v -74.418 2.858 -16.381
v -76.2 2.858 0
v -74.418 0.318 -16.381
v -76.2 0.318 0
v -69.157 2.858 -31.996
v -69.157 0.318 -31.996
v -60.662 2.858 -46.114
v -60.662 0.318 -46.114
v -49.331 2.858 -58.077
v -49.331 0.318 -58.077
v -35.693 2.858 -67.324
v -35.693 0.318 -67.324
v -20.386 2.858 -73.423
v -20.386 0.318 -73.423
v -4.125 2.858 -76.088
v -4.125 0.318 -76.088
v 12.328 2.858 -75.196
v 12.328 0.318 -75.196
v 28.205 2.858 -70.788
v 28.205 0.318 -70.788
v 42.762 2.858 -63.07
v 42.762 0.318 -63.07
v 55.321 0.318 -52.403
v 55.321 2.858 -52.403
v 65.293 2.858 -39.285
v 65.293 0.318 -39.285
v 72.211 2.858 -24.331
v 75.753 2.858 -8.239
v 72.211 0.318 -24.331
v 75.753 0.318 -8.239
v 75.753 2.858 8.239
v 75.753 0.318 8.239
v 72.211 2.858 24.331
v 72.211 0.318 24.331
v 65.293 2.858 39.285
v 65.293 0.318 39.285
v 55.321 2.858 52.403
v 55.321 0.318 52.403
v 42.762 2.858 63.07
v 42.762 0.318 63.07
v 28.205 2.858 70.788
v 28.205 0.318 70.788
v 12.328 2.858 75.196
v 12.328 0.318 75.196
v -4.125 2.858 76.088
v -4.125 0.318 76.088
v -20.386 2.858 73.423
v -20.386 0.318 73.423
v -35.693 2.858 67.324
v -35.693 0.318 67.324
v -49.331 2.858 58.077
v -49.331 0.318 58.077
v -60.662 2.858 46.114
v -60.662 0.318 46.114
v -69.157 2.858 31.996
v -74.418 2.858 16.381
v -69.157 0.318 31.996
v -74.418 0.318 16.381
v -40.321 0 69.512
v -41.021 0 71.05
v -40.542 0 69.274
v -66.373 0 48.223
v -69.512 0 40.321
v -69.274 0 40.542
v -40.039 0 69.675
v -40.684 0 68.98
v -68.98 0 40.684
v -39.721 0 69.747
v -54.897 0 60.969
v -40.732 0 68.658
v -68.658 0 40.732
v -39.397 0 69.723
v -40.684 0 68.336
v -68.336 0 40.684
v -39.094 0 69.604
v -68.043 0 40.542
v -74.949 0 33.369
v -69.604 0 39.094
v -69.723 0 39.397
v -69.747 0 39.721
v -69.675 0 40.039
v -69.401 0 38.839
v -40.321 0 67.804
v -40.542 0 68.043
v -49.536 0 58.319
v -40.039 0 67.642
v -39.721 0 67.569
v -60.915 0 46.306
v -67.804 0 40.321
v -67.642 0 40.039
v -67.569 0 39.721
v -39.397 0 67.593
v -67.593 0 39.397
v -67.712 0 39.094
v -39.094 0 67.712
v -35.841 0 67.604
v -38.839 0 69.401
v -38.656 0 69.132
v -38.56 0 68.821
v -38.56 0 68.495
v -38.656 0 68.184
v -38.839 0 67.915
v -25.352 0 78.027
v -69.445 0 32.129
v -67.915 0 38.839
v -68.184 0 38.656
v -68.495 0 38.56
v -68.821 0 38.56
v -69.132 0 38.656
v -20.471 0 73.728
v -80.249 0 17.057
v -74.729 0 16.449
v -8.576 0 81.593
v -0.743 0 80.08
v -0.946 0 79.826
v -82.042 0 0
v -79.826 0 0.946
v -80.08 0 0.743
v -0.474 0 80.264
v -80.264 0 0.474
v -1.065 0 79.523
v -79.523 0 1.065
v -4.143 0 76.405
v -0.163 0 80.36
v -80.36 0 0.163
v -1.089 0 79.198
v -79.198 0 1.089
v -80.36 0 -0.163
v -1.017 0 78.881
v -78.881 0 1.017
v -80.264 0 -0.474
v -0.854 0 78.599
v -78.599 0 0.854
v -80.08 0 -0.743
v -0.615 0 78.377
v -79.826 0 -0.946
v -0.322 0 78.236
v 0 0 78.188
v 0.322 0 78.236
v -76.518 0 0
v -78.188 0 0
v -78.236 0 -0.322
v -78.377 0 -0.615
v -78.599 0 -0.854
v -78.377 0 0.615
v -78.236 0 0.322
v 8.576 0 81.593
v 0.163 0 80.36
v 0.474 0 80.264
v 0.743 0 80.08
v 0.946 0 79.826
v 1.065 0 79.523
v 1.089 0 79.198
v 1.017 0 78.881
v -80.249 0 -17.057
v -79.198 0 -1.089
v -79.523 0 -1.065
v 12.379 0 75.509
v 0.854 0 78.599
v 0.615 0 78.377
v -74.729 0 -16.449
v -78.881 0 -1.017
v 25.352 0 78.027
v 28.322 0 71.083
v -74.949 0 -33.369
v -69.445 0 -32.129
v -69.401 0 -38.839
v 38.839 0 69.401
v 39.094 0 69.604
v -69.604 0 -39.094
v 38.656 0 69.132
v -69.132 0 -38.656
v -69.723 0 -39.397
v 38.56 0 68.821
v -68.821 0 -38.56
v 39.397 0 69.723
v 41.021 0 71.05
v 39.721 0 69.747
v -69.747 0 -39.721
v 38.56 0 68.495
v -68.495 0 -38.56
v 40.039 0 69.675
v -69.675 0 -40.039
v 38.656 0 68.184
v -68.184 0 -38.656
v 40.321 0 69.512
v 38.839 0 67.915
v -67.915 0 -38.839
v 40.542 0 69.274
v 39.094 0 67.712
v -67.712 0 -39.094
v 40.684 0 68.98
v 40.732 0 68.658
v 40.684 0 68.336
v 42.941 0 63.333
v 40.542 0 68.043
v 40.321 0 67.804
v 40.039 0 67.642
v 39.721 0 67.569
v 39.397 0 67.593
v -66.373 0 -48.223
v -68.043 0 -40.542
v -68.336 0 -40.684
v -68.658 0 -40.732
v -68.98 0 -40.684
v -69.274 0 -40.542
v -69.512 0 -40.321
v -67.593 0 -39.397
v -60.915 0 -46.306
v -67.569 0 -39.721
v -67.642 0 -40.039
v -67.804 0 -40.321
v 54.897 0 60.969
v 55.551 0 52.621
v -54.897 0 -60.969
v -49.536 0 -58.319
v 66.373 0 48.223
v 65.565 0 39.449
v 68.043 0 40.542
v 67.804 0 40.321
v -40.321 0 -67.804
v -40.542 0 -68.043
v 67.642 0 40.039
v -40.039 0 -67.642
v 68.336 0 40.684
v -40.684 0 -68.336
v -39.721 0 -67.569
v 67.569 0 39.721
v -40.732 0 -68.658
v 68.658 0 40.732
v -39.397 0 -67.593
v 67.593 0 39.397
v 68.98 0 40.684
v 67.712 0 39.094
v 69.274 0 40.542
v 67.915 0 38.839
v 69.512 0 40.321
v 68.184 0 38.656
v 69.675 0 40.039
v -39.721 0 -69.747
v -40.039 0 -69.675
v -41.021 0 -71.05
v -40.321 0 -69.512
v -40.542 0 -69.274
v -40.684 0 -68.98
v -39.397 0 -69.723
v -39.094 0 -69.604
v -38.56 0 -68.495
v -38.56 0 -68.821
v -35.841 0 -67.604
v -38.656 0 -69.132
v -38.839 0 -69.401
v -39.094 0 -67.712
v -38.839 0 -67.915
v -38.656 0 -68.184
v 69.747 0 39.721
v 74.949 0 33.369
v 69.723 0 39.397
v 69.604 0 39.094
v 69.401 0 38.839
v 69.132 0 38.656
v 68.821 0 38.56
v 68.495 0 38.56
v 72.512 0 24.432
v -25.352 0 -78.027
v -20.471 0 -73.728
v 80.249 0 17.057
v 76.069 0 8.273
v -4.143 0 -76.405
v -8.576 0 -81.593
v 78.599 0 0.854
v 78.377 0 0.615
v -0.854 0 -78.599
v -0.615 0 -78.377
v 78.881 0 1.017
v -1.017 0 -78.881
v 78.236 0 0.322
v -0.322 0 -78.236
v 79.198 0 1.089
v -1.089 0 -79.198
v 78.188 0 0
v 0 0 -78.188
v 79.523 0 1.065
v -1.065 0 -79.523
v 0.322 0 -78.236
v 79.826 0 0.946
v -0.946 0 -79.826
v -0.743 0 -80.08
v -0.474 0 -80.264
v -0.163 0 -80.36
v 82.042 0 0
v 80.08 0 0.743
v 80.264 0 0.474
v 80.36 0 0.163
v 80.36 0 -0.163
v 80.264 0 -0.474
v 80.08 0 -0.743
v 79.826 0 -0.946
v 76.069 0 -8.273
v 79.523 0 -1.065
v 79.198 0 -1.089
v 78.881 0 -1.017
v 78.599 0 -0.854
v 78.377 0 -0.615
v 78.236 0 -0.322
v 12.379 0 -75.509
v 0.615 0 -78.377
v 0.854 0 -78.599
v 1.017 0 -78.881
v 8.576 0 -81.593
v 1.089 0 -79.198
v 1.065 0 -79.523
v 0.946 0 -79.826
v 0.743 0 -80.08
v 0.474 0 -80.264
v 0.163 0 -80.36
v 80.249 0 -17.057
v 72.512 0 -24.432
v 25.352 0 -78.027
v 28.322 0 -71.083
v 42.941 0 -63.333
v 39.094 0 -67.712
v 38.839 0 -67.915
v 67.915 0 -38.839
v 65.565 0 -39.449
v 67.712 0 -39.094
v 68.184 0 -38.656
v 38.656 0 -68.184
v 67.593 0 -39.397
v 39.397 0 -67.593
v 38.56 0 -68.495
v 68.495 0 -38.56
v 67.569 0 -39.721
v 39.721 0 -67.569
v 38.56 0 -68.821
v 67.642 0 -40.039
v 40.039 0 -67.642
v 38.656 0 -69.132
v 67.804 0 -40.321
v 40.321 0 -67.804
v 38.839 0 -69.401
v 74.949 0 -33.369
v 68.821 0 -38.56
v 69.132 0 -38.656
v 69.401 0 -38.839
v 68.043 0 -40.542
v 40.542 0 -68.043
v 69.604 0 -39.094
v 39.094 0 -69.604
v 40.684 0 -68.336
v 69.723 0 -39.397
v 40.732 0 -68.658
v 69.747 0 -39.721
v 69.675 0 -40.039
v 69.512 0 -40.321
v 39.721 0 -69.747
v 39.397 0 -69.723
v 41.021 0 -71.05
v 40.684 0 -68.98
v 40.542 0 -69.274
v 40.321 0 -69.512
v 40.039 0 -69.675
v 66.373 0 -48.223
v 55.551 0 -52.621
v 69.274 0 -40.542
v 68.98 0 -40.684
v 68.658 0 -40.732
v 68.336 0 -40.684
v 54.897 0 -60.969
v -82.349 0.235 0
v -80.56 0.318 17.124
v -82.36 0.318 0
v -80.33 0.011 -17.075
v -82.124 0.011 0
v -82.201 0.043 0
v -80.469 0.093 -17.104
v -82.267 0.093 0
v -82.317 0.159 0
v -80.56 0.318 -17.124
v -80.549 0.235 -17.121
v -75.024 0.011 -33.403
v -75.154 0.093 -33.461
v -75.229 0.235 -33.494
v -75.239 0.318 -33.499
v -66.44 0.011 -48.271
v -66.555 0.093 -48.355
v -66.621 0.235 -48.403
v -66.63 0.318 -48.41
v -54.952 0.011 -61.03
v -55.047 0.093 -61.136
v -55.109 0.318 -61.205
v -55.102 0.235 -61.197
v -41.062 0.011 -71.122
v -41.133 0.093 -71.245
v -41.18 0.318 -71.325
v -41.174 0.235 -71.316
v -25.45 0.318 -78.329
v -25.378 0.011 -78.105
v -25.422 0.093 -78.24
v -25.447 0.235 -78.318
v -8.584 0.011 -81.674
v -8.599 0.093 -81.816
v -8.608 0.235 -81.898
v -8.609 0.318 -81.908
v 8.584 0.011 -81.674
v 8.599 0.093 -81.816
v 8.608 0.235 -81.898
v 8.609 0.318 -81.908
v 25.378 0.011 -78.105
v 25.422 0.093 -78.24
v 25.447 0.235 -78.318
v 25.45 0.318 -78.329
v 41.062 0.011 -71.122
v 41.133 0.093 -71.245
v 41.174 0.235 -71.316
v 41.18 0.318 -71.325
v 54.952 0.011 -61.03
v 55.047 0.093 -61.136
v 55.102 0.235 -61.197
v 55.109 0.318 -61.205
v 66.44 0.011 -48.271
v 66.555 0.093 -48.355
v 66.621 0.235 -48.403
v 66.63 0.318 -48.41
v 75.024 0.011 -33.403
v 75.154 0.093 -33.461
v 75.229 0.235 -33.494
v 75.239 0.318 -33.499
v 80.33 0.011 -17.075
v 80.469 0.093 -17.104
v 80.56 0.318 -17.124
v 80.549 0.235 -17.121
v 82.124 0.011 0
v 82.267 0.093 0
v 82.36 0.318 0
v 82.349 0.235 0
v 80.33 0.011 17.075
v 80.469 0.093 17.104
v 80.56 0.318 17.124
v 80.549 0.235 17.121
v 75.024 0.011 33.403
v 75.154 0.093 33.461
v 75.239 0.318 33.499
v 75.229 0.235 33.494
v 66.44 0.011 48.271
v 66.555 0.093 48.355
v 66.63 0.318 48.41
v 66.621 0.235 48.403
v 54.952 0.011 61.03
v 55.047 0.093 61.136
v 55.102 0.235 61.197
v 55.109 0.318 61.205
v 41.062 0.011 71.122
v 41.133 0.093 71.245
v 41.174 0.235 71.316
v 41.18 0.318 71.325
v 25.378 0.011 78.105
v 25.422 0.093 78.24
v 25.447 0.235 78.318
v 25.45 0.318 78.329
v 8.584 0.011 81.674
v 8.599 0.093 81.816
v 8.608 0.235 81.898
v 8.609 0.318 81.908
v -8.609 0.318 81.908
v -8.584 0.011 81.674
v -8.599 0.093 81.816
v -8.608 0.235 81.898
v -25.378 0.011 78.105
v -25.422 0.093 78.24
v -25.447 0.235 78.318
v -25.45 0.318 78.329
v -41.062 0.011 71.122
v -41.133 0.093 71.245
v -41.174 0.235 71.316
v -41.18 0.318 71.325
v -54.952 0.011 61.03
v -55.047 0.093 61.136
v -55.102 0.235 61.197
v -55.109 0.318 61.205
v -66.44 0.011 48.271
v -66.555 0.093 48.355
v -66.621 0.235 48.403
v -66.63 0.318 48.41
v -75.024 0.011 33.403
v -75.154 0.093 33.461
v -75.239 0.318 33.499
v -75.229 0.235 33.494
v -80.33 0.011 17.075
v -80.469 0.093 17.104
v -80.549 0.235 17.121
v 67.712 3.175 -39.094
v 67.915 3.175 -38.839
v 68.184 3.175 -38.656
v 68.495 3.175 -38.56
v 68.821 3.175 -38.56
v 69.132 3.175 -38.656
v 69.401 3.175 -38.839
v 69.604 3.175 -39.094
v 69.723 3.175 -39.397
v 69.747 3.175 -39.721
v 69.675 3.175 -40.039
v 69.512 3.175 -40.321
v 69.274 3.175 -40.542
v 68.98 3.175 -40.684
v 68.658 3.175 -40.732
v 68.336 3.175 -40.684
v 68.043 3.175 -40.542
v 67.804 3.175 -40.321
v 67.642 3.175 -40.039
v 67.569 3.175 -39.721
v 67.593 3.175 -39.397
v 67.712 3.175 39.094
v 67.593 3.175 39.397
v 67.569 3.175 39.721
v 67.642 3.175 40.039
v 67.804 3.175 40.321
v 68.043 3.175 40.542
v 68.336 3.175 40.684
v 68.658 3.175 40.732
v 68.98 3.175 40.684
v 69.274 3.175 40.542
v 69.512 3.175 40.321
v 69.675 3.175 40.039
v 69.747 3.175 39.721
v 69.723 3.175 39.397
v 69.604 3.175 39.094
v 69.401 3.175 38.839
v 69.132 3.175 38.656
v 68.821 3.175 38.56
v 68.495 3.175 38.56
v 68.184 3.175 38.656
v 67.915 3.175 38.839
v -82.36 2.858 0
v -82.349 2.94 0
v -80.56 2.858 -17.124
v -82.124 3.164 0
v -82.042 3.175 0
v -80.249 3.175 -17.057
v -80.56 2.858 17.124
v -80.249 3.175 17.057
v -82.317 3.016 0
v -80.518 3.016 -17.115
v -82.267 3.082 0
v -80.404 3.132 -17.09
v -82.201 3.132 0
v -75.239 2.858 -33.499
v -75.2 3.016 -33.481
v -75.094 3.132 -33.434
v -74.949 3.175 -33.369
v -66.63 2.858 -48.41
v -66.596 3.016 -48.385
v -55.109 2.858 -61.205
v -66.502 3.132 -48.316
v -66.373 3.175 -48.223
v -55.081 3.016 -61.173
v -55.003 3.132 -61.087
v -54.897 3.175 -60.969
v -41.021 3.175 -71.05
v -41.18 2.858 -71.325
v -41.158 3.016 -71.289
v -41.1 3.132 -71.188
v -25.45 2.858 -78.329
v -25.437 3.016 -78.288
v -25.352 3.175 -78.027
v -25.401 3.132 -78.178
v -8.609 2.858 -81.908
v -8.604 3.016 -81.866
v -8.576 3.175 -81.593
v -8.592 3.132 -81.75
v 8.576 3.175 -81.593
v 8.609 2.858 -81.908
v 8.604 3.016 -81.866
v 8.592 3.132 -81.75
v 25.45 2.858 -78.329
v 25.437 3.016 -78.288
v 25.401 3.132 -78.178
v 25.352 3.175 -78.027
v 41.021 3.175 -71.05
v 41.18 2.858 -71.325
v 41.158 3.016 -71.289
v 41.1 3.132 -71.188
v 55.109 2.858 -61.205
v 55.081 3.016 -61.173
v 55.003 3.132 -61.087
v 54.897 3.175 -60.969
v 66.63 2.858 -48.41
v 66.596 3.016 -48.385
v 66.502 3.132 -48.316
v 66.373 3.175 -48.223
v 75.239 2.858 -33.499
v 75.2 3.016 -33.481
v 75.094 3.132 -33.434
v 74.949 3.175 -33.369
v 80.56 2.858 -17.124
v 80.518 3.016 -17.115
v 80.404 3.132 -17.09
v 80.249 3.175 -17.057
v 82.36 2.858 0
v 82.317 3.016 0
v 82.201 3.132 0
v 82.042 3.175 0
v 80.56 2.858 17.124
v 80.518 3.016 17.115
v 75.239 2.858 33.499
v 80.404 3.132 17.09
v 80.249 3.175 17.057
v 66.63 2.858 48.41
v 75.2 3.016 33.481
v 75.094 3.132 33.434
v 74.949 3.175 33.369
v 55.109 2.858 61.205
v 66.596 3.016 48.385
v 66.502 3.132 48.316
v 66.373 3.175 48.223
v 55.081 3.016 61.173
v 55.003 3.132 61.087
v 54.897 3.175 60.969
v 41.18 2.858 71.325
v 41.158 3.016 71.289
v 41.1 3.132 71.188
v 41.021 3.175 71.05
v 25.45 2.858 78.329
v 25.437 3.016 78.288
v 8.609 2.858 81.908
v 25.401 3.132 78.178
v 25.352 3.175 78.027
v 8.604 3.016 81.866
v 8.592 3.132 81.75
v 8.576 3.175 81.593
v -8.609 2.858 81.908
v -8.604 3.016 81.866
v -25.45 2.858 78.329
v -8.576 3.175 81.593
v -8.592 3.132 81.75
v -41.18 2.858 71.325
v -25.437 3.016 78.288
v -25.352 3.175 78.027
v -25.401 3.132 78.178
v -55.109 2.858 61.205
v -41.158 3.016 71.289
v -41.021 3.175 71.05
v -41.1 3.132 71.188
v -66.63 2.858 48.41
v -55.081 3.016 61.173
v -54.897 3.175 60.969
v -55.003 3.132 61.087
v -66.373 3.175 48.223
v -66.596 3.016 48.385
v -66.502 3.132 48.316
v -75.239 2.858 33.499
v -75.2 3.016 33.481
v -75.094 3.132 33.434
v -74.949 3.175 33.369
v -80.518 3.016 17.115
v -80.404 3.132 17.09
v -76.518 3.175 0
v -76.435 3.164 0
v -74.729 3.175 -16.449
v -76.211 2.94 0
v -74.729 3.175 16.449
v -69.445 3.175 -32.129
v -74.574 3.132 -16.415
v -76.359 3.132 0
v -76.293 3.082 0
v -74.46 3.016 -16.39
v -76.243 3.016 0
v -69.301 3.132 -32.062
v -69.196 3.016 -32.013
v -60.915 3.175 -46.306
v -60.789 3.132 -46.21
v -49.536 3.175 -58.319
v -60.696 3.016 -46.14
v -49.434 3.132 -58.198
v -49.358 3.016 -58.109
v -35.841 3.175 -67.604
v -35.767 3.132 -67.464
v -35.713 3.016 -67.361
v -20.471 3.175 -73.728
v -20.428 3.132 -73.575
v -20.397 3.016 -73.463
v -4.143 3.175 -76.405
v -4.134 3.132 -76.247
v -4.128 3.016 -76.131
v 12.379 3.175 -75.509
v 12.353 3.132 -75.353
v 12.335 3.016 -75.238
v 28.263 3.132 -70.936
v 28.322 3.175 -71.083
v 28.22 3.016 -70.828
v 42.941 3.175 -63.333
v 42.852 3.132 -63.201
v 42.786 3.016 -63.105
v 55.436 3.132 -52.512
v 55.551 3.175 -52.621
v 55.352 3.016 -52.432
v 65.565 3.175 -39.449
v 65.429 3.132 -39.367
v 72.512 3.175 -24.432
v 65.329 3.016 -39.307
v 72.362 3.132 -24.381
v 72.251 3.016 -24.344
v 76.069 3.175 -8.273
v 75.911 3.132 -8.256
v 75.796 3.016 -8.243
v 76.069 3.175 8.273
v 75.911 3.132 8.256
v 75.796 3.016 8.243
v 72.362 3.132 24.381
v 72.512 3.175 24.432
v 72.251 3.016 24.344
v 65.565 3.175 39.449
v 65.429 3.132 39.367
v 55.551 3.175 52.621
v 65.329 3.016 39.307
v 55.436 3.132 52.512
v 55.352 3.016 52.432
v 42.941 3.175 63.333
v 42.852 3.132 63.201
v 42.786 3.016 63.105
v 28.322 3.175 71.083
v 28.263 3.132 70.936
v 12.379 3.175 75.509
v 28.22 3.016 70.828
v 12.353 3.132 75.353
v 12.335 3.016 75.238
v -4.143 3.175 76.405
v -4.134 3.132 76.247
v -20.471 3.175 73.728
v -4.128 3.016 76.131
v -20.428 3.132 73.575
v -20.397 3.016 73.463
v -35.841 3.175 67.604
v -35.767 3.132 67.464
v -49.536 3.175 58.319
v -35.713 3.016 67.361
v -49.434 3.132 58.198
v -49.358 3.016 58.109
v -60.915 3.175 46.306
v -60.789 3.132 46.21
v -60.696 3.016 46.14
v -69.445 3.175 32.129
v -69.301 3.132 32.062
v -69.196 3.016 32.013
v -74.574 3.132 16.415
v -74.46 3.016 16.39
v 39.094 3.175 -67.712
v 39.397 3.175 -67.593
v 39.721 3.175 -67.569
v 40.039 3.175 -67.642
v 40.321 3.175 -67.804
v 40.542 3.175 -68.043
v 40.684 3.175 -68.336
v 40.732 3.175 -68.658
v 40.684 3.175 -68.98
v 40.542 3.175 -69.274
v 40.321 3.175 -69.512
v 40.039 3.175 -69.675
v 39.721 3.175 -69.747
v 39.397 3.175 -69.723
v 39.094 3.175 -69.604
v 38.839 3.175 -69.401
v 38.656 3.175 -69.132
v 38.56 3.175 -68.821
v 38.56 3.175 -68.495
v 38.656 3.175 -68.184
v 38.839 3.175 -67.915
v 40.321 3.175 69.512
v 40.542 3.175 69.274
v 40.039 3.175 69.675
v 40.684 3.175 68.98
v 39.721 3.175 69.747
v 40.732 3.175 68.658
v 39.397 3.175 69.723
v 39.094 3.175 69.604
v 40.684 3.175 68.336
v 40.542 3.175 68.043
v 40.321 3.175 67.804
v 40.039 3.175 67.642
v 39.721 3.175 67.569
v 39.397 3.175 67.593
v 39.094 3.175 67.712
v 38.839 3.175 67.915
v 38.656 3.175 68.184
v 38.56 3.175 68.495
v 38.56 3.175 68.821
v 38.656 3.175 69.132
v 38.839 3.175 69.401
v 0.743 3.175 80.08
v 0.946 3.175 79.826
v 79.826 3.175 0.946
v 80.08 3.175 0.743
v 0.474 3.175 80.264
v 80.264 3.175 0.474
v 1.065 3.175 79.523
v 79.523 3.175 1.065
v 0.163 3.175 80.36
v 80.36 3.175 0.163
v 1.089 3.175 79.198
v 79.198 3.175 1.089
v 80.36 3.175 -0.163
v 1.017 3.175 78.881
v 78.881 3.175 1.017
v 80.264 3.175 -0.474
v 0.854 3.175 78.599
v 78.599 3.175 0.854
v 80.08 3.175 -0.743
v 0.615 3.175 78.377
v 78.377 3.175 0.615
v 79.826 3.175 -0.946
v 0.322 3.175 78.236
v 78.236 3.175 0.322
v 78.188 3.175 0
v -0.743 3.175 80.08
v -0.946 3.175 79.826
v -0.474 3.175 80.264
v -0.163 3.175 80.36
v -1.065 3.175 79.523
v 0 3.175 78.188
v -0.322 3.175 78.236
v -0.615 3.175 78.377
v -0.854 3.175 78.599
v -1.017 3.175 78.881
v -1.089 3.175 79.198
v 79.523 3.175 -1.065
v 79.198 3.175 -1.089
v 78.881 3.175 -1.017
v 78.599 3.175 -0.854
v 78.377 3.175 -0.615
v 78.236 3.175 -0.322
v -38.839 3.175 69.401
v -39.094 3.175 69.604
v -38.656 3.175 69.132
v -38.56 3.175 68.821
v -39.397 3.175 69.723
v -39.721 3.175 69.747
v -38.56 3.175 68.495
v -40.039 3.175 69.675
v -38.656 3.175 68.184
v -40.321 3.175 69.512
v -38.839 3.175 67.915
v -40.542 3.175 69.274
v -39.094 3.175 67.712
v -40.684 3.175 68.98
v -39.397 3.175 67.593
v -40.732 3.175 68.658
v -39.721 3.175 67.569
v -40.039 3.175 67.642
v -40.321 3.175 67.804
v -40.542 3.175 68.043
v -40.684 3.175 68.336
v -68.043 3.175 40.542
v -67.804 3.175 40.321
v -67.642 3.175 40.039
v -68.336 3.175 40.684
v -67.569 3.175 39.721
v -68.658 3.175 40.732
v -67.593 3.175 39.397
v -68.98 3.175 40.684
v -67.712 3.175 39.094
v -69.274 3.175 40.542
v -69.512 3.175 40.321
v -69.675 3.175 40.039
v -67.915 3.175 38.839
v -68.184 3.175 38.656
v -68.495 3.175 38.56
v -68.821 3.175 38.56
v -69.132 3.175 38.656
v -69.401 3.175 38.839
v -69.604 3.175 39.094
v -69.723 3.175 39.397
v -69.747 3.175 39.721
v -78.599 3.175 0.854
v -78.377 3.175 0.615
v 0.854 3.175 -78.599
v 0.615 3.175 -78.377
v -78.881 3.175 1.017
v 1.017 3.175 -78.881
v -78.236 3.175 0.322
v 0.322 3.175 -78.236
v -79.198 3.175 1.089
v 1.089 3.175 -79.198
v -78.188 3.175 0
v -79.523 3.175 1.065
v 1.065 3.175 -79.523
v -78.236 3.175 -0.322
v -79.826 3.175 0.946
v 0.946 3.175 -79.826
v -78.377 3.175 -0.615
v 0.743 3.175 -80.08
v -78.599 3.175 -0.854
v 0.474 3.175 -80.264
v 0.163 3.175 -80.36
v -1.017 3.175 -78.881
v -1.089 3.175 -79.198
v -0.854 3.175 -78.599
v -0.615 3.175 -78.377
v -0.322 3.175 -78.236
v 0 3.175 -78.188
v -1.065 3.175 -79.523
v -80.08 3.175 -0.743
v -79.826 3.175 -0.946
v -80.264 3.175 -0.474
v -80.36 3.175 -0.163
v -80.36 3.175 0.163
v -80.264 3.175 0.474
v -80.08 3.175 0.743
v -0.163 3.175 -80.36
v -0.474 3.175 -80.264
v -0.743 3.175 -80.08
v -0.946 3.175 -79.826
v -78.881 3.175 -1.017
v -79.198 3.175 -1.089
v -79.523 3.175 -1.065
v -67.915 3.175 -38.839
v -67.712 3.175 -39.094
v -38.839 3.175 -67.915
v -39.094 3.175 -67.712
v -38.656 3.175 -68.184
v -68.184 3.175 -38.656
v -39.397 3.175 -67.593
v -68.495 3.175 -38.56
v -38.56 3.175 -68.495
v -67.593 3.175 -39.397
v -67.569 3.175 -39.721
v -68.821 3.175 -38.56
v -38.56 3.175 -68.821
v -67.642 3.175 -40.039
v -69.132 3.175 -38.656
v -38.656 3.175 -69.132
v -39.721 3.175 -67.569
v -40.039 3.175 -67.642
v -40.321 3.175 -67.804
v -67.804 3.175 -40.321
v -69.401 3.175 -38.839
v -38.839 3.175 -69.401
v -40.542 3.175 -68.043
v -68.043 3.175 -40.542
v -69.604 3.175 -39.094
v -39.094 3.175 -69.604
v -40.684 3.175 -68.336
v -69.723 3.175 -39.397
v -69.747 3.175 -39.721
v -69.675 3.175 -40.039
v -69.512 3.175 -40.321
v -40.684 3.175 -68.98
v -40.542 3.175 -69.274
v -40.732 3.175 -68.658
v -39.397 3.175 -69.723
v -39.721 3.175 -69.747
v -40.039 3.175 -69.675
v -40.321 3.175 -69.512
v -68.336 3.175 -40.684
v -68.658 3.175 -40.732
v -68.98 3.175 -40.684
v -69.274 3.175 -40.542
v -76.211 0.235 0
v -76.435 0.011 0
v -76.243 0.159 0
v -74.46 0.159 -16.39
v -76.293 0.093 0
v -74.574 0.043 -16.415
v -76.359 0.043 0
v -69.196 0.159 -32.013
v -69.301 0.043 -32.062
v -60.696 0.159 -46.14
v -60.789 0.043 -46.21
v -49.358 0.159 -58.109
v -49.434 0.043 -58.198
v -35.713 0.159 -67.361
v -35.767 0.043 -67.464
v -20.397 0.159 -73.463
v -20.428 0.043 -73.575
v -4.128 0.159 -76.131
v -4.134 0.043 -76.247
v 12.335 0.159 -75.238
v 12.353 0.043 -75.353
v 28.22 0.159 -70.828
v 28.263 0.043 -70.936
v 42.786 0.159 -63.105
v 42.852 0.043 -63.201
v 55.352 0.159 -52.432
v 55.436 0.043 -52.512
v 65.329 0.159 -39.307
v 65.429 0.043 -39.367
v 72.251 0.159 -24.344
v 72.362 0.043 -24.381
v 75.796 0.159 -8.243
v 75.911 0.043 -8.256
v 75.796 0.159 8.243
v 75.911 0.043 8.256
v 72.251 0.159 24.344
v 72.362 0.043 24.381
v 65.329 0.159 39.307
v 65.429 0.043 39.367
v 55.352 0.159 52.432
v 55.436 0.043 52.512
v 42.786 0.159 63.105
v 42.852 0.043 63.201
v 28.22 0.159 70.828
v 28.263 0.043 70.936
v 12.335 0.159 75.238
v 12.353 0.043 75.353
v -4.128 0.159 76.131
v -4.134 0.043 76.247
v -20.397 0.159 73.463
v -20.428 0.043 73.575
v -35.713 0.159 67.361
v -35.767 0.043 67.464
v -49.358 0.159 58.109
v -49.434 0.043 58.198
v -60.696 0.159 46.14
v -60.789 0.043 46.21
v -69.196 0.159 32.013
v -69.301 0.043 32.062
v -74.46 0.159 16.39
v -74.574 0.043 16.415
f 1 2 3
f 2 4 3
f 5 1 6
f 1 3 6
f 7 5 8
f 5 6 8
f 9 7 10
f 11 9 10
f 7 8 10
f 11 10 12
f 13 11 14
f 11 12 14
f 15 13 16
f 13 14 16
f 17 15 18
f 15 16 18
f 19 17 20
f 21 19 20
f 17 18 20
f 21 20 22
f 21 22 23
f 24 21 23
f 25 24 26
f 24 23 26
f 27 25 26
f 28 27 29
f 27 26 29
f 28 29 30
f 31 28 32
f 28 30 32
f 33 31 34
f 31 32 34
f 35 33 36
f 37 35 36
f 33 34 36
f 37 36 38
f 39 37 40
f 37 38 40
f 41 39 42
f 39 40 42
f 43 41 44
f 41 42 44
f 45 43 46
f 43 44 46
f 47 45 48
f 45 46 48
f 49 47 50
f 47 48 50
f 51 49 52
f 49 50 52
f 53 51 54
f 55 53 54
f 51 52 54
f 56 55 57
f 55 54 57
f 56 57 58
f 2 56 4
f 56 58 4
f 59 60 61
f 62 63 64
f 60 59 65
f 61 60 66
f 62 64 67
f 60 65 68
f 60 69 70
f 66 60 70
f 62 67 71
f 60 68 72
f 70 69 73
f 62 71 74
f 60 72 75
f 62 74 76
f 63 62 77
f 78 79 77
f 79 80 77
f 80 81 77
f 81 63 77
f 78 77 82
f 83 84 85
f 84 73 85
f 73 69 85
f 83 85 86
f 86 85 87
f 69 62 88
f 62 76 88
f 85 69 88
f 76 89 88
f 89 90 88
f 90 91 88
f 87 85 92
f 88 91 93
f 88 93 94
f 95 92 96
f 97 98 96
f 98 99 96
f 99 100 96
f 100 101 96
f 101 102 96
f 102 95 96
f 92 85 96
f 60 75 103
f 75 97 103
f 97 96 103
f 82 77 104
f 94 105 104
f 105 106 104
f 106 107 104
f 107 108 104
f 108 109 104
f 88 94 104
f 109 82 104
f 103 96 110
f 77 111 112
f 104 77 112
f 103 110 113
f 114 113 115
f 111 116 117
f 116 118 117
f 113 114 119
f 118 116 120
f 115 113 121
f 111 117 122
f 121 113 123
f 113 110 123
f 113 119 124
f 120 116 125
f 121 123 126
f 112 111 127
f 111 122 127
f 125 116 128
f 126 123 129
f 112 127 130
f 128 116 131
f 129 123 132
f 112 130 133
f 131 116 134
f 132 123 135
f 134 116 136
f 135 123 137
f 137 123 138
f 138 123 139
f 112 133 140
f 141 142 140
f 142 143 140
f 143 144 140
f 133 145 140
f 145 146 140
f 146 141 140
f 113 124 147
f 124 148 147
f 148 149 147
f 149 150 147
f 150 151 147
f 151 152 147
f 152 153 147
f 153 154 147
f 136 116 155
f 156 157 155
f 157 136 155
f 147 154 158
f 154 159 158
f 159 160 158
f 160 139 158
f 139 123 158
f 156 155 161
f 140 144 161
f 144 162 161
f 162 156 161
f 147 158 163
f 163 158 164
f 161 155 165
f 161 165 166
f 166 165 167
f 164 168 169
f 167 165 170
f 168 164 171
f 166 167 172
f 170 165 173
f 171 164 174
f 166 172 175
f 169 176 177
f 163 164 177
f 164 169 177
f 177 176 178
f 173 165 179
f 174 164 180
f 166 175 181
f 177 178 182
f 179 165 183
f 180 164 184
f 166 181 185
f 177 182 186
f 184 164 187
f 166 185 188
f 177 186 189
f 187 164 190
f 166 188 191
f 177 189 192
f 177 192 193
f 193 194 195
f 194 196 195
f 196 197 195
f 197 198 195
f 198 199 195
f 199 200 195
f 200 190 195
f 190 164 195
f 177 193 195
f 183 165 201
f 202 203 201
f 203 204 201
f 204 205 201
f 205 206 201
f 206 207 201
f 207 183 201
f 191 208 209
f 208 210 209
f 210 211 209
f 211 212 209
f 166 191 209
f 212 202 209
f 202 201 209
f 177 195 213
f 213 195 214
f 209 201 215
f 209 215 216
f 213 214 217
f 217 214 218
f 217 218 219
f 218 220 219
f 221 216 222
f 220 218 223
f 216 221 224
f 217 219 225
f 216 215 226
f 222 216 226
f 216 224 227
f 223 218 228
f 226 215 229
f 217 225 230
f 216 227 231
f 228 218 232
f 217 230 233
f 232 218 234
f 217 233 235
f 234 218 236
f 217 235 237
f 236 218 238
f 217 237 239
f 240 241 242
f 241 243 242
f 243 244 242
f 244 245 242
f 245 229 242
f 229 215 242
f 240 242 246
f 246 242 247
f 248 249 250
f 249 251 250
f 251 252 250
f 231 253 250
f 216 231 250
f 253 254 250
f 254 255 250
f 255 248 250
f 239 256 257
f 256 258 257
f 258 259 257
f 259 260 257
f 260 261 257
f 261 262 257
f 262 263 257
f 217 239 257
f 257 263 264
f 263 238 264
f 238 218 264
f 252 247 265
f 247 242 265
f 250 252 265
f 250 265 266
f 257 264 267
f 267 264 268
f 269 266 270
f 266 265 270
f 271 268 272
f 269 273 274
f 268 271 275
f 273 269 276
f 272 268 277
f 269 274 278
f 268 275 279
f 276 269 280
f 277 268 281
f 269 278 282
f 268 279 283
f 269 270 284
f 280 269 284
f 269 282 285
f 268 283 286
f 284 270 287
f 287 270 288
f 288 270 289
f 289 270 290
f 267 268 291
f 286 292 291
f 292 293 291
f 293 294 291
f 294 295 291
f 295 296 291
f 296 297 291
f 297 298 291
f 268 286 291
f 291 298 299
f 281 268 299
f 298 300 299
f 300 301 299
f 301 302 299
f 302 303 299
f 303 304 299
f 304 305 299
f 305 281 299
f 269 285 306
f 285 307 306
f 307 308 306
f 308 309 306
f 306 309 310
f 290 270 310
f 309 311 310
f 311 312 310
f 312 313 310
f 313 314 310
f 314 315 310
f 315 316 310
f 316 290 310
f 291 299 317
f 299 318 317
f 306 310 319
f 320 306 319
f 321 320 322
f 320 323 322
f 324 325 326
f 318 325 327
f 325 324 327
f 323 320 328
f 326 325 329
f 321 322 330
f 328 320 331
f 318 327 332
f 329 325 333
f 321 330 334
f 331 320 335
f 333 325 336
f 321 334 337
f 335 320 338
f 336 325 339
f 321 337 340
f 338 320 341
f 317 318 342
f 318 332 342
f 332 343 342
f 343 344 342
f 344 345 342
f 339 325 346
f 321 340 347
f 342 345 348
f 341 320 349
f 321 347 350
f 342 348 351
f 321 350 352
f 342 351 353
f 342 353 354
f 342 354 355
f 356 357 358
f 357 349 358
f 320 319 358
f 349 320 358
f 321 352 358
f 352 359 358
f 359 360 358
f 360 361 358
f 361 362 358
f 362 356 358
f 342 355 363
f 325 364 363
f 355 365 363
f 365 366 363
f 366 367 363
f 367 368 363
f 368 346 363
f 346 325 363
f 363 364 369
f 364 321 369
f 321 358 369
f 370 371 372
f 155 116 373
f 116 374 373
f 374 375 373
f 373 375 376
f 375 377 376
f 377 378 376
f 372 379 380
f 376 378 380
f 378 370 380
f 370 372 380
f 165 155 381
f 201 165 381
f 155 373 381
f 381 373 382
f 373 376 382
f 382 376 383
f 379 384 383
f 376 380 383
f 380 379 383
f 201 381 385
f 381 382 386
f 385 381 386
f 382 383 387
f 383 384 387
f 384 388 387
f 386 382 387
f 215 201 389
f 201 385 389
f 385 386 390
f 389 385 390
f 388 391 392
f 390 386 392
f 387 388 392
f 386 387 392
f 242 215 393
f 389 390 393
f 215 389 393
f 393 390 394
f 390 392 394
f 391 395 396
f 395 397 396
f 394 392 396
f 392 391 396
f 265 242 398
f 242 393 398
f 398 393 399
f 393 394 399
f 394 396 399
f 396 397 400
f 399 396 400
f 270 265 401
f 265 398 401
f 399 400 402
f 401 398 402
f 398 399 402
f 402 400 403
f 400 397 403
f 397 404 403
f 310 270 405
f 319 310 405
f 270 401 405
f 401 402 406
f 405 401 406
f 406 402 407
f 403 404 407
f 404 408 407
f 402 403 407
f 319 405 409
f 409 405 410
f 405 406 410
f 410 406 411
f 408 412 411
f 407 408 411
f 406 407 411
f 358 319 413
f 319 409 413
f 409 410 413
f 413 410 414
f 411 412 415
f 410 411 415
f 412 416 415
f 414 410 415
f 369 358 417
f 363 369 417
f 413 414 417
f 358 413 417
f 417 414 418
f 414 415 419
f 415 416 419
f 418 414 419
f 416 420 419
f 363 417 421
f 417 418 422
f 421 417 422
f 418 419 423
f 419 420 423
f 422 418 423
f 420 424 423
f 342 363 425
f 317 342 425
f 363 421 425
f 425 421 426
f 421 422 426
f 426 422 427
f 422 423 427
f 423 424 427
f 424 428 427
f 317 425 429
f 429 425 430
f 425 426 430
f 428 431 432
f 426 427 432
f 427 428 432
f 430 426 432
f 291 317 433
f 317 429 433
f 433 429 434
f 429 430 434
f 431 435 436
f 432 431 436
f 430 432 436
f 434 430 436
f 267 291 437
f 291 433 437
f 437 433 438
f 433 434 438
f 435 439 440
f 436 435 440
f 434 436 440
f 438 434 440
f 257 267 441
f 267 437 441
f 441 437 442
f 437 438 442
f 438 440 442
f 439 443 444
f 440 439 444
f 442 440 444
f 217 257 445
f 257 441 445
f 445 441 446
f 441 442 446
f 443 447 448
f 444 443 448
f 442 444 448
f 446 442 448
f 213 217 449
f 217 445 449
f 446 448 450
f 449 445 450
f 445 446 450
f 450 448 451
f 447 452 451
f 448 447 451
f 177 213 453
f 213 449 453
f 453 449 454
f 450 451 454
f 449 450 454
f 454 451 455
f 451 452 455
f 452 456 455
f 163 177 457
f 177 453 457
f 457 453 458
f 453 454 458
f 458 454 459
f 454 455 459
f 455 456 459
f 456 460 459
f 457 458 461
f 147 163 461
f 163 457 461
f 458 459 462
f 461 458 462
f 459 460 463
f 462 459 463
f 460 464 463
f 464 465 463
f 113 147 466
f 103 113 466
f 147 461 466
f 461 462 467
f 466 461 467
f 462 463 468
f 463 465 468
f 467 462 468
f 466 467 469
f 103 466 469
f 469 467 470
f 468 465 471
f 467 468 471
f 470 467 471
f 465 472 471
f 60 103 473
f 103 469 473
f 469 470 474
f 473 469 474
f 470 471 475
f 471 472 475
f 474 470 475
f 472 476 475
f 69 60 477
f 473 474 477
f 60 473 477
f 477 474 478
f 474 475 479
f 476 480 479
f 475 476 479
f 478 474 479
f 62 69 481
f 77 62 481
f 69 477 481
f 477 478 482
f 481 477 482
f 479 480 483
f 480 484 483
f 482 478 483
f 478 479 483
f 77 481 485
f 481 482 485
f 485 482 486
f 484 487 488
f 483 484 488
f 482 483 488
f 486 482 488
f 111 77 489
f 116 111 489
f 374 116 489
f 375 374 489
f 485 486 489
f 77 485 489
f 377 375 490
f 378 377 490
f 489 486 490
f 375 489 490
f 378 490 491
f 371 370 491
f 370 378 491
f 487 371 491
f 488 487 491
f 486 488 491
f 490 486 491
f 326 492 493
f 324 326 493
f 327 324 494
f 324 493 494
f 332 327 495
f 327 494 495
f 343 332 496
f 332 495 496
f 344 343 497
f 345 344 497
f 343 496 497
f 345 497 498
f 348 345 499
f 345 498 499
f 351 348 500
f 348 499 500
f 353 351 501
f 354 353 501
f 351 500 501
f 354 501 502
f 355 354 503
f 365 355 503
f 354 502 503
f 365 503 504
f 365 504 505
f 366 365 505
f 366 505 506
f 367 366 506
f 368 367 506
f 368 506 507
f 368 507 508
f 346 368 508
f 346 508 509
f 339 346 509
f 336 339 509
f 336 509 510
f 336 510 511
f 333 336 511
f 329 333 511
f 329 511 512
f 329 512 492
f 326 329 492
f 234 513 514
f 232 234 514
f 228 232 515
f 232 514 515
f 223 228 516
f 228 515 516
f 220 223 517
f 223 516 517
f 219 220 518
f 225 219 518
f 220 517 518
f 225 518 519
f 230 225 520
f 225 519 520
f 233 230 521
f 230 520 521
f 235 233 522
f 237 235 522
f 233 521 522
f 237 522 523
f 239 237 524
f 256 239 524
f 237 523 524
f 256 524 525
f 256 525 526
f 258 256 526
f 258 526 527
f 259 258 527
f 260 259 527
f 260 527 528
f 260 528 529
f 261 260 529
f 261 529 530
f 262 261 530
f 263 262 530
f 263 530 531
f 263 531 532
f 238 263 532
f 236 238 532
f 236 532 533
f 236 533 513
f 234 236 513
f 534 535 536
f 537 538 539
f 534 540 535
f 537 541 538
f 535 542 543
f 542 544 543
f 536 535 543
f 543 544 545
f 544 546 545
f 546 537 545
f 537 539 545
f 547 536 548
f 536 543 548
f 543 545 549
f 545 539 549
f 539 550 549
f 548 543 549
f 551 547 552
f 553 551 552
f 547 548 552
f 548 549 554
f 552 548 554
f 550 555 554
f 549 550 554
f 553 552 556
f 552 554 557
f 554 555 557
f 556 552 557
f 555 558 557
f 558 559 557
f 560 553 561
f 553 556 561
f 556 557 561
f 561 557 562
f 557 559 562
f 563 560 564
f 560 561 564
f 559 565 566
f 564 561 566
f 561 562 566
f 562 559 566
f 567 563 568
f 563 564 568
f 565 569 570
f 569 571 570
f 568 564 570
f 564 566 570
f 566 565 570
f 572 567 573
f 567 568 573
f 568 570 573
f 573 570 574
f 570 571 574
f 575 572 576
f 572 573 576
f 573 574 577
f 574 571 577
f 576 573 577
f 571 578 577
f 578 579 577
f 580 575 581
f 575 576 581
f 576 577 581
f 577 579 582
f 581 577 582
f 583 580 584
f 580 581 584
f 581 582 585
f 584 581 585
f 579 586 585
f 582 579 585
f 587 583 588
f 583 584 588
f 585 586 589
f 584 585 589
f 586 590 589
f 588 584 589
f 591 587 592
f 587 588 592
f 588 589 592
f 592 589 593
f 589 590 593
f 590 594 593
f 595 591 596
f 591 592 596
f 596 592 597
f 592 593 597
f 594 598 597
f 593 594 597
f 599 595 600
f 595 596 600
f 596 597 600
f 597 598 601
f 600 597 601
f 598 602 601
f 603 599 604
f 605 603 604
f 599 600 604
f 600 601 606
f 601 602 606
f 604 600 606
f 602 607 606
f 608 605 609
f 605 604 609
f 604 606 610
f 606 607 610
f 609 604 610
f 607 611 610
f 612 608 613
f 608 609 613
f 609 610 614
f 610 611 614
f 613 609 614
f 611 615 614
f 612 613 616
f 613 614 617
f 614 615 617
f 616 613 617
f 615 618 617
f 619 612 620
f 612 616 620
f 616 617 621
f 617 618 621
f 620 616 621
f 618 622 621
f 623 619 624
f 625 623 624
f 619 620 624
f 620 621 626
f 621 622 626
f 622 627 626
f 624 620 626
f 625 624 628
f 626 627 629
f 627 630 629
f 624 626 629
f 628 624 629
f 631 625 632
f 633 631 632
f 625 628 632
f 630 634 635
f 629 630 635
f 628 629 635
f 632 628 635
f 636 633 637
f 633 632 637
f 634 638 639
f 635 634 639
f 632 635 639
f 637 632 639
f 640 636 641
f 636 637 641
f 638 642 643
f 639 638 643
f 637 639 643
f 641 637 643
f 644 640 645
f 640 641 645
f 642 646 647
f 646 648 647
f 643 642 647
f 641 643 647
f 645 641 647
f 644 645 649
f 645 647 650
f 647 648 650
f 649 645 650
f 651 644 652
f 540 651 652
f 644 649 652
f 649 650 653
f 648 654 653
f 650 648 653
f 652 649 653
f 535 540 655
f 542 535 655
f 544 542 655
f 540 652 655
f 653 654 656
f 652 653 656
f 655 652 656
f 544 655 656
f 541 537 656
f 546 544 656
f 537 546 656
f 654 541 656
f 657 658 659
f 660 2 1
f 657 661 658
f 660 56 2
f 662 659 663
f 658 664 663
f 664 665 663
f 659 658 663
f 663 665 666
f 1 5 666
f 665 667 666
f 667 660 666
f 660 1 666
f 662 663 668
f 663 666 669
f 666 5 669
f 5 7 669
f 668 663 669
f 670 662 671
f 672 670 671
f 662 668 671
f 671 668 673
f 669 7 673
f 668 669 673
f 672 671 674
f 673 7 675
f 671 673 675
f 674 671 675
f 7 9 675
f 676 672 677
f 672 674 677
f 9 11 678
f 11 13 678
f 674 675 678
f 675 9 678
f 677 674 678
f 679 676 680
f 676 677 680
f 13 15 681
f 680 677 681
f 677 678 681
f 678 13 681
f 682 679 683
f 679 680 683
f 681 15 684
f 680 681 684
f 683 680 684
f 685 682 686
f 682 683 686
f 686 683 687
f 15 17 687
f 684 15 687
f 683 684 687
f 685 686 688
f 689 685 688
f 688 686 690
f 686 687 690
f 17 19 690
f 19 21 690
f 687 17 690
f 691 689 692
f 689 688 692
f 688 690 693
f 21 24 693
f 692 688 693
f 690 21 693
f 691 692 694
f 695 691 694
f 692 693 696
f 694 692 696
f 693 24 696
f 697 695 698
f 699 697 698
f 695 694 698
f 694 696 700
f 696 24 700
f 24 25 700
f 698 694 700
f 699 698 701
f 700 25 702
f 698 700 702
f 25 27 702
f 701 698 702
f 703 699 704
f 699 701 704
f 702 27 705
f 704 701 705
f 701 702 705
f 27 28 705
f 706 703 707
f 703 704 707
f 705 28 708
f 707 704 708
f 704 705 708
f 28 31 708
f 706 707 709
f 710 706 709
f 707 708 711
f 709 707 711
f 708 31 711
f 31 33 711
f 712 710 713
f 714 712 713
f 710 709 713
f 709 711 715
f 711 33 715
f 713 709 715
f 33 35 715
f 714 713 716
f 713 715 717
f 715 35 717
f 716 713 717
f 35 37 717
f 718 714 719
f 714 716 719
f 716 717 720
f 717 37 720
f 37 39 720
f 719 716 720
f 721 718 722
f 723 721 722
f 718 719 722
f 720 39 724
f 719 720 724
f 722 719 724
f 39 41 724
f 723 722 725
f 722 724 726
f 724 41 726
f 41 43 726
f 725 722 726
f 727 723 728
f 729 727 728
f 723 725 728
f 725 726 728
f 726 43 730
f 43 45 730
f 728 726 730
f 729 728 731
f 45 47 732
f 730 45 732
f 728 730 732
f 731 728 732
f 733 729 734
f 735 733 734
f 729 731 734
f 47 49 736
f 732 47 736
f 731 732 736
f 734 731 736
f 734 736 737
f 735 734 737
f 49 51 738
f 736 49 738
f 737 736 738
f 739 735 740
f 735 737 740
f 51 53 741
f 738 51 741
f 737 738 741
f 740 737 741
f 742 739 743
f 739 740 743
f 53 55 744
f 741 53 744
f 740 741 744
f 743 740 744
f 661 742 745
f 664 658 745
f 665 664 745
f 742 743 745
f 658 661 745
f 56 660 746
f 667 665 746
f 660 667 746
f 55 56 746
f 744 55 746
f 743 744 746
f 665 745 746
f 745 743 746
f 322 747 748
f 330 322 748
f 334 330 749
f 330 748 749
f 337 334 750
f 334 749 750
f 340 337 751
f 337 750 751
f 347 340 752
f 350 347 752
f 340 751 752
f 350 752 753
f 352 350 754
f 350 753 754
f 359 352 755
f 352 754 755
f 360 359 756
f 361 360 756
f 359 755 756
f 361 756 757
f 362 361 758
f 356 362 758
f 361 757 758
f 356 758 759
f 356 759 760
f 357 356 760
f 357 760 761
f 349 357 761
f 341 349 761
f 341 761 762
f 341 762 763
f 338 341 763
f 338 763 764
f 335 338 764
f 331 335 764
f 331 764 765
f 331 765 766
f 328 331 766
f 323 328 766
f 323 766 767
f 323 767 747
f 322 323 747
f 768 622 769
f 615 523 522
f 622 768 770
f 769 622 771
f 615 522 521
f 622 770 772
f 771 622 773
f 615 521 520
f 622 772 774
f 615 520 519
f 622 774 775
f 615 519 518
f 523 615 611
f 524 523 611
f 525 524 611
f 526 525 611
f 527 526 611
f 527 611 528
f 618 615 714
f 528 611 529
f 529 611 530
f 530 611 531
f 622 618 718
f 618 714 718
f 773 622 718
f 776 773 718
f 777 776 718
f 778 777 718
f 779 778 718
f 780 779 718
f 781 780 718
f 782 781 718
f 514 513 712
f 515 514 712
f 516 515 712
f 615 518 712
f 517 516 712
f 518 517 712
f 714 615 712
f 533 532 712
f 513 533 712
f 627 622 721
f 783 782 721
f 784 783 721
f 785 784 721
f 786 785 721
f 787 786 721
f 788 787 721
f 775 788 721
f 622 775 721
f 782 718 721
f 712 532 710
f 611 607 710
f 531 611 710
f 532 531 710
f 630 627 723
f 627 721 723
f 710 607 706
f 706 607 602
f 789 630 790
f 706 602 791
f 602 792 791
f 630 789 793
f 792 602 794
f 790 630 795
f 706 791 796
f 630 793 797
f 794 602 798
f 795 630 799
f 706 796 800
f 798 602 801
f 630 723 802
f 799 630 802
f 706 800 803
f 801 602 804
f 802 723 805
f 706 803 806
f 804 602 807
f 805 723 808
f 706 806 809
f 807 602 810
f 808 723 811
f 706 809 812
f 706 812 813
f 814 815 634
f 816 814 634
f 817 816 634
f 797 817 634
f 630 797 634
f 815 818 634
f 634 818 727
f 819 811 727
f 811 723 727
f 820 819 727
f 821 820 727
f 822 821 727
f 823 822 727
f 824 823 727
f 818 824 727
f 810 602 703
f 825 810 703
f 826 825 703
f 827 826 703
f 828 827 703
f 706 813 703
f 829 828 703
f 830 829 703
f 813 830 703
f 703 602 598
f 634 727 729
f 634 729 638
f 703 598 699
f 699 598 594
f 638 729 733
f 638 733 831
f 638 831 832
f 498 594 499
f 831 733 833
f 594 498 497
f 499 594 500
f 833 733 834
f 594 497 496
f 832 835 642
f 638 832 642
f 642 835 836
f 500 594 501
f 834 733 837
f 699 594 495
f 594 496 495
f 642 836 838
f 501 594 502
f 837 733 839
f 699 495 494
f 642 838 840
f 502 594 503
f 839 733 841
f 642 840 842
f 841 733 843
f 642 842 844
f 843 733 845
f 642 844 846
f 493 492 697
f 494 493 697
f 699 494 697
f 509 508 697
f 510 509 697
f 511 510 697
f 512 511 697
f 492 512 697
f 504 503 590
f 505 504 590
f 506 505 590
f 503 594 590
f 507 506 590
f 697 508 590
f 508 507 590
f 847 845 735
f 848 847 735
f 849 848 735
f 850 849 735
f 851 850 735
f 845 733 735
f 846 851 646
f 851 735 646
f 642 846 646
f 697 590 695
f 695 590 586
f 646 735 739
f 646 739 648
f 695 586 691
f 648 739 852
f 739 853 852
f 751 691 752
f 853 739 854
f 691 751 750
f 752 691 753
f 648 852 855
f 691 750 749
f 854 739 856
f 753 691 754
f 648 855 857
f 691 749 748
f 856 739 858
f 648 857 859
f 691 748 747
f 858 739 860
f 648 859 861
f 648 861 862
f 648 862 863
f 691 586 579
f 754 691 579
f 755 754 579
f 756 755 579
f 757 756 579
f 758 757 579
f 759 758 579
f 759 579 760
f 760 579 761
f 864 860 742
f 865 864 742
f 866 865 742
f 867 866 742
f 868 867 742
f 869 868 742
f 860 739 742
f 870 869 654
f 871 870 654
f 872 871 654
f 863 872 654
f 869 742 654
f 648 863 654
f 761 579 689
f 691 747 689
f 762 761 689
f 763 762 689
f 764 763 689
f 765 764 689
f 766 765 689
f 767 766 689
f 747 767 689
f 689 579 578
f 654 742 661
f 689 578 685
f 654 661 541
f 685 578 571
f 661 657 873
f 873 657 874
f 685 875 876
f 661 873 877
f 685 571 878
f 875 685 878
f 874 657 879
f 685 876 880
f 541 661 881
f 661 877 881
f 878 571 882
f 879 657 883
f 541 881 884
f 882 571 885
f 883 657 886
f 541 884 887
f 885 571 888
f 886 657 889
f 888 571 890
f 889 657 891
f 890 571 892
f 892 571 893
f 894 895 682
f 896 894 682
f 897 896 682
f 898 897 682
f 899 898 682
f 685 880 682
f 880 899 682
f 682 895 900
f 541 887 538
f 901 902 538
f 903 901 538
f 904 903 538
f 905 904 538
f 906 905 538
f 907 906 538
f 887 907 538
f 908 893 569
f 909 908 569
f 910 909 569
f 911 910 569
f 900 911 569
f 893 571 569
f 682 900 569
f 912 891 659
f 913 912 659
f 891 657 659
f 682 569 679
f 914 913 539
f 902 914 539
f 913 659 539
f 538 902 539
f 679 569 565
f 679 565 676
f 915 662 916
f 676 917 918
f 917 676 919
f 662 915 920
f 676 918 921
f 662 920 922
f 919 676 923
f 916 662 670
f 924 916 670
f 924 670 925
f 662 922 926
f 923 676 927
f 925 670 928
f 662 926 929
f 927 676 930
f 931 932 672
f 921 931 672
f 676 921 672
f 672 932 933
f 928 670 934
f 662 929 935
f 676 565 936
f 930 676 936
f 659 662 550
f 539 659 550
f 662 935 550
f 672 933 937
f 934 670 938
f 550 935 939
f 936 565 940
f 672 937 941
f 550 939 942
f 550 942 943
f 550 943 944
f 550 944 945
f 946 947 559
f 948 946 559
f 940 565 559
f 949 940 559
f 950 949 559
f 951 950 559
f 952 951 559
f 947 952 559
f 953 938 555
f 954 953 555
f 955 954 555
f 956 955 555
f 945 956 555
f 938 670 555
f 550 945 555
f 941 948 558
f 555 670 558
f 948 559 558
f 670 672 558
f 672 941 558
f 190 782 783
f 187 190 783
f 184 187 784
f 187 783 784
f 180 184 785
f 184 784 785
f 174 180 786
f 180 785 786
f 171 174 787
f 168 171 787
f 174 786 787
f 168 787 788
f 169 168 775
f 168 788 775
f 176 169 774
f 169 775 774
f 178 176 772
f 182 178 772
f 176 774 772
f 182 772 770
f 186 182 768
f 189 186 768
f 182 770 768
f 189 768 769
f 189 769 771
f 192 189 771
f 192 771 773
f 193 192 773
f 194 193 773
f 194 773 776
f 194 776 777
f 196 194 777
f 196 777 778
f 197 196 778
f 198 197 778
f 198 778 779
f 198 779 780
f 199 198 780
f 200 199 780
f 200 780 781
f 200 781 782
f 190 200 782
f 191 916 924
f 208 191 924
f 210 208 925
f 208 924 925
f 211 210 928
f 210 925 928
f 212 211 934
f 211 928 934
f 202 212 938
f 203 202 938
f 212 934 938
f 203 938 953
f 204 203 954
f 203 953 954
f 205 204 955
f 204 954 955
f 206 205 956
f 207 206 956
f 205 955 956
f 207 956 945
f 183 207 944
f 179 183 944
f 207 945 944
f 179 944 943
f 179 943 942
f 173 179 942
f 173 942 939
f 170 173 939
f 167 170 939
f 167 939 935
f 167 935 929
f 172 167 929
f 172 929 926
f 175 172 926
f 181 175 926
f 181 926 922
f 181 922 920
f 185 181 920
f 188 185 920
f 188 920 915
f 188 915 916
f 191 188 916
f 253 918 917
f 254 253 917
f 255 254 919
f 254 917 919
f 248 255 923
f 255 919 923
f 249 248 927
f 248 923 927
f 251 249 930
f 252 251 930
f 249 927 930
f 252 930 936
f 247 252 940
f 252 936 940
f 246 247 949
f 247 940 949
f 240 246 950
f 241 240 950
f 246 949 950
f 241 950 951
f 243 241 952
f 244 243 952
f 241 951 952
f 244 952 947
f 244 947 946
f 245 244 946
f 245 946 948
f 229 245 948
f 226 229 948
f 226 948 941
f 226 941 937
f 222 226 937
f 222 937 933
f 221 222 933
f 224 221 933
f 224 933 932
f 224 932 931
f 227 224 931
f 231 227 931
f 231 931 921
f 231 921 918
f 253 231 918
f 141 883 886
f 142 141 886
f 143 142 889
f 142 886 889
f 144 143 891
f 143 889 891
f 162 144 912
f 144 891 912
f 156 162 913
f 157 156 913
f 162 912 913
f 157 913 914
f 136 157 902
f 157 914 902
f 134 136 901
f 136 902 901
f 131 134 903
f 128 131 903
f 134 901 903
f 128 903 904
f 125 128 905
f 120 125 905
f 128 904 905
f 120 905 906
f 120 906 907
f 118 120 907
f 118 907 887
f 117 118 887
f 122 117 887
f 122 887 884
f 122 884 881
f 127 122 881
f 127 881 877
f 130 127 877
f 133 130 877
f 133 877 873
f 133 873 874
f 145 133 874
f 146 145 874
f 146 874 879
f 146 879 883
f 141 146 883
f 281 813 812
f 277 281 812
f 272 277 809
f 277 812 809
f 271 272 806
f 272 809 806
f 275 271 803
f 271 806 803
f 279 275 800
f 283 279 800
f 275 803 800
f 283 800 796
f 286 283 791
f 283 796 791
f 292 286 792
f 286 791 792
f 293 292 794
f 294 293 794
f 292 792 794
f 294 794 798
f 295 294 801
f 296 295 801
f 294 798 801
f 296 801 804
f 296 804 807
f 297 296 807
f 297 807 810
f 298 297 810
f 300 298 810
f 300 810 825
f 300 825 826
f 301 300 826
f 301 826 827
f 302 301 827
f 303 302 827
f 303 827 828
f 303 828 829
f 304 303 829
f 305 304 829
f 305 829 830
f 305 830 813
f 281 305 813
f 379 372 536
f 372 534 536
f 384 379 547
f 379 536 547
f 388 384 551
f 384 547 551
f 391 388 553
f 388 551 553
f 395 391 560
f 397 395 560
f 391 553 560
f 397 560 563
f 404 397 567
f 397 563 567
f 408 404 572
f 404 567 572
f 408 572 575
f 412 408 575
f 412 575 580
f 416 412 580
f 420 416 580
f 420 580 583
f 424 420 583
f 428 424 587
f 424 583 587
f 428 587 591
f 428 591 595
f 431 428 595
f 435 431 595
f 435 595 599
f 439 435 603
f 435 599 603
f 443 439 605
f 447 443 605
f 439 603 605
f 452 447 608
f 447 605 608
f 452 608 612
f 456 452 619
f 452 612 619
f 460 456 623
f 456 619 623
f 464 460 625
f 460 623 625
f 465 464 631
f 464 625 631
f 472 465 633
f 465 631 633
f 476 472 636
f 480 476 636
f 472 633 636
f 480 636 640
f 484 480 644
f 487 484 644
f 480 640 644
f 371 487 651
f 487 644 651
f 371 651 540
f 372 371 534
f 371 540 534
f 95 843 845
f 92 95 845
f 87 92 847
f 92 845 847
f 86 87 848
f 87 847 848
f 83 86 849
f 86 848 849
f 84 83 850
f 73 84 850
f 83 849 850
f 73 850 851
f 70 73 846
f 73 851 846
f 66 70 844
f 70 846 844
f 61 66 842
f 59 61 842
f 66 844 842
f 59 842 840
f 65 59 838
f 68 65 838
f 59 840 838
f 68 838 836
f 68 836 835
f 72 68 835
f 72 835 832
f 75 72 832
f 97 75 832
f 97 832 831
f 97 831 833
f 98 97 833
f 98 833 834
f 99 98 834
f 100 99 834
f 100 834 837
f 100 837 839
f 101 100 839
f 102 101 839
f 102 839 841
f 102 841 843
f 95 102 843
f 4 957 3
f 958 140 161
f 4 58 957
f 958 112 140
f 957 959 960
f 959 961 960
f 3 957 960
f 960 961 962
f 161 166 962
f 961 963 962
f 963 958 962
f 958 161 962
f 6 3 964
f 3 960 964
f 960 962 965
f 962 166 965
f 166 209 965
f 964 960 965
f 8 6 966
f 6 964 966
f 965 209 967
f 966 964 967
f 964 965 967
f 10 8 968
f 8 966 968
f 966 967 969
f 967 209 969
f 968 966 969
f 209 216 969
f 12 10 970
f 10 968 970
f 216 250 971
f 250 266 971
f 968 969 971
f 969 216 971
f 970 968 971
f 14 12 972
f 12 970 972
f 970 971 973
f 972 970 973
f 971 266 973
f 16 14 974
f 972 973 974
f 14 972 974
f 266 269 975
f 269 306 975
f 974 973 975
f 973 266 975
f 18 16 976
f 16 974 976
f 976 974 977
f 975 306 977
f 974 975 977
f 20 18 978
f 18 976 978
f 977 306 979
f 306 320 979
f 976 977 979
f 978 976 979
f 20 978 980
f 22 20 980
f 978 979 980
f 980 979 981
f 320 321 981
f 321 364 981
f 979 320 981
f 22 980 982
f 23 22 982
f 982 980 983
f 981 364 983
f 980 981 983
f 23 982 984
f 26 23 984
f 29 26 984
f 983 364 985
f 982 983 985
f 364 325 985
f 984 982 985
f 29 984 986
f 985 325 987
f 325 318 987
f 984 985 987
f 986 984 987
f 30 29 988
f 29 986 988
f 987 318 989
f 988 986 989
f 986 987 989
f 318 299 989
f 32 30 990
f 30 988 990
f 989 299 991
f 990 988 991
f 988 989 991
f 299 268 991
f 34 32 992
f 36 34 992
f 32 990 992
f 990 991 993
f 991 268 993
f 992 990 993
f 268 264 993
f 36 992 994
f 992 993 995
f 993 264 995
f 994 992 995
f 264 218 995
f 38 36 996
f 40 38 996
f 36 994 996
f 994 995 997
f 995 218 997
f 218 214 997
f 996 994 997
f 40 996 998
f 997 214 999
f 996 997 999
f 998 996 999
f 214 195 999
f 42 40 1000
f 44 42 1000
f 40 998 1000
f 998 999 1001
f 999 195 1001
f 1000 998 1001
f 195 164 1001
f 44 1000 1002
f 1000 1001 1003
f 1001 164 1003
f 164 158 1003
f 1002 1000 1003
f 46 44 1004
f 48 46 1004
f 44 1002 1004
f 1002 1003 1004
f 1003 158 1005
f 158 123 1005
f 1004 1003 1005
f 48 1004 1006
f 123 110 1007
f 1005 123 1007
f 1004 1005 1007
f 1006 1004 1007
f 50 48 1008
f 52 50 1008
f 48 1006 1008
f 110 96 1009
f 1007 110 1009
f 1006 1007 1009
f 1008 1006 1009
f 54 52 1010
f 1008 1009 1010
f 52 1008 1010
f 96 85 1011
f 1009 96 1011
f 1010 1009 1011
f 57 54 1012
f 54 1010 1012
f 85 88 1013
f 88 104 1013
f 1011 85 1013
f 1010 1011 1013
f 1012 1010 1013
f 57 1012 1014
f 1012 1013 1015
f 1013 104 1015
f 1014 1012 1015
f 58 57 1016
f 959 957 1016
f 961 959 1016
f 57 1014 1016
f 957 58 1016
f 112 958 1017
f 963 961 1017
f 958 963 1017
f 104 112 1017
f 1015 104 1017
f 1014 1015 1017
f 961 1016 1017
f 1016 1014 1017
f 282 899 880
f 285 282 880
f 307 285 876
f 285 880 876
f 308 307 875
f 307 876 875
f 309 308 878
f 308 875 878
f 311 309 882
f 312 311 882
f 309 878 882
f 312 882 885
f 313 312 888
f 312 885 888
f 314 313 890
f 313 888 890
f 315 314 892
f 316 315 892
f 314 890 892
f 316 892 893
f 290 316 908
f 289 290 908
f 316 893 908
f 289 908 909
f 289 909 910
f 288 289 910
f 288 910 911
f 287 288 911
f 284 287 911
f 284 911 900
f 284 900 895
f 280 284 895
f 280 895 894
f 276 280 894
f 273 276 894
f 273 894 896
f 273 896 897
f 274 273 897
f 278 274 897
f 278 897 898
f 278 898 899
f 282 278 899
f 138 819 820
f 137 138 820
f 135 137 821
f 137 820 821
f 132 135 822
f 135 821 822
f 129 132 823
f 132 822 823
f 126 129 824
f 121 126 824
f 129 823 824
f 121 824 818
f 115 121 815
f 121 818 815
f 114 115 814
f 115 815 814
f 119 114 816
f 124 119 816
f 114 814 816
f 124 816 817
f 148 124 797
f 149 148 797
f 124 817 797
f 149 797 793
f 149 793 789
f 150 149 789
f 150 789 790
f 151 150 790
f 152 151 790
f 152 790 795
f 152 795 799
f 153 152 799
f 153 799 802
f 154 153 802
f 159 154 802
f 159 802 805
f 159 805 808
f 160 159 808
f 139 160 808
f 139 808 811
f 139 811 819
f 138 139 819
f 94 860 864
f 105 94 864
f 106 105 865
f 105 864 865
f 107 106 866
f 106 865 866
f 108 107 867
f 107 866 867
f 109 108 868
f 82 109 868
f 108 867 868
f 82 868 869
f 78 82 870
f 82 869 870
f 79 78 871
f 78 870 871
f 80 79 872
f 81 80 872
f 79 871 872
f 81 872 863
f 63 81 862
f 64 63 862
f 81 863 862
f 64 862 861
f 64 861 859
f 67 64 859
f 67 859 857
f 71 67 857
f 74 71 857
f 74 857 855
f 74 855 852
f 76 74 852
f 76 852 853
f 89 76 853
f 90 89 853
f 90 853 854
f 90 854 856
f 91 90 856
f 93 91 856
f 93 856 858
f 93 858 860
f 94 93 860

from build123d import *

# Parameters (mm, degrees)
F_44_0_086_DIAMETER_HOLE1_D = 2.1844
SCREW_PASSTHROUGHS_COUNT    = 12


with BuildPart() as part:
    # Sketch1 → Main (revolve)
    with BuildSketch(Plane.XY):
        with BuildLine():
            Line((-76.5175, 0), (-82.042, 0))
            ThreePointArc((-82.042, 0), (-82.266506403, 0.092993597), (-82.3595, 0.3175))
            Line((-82.3595, 0.3175), (-82.3595, 2.8575))
            ThreePointArc((-82.3595, 2.8575), (-82.266506403, 3.082006403), (-82.042, 3.175))
            Line((-82.042, 3.175), (-76.5175, 3.175))
            ThreePointArc((-76.5175, 3.175), (-76.292993597, 3.082006403), (-76.2, 2.8575))
            Line((-76.2, 2.8575), (-76.2, 0.3175))
            ThreePointArc((-76.2, 0.3175), (-76.292993597, 0.092993597), (-76.5175, 0))
        make_face()
    revolve(axis=Axis((0, 55, 0), (0, -1, 0)))

    # #44 (0.086) Diameter Hole1 (through all)
    with Locations(Plane(origin=(0, 0, 0), x_dir=(-1, 0, 0), z_dir=(0, -1, 0))):
        with Locations((79.27975, 0)):
            f_44_0_086_diameter_hole1 = Hole(F_44_0_086_DIAMETER_HOLE1_D / 2)

    # Screw Passthroughs: #44 (0.086) Diameter Hole1 ×12 about axis
    screw_passthroughs_axis = Axis((0, 0, 0), (0, 1, 0))
    for i in range(1, SCREW_PASSTHROUGHS_COUNT):
        add(f_44_0_086_diameter_hole1.rotate(screw_passthroughs_axis, i * 360 / SCREW_PASSTHROUGHS_COUNT), mode=Mode.SUBTRACT)


solid = part.part
